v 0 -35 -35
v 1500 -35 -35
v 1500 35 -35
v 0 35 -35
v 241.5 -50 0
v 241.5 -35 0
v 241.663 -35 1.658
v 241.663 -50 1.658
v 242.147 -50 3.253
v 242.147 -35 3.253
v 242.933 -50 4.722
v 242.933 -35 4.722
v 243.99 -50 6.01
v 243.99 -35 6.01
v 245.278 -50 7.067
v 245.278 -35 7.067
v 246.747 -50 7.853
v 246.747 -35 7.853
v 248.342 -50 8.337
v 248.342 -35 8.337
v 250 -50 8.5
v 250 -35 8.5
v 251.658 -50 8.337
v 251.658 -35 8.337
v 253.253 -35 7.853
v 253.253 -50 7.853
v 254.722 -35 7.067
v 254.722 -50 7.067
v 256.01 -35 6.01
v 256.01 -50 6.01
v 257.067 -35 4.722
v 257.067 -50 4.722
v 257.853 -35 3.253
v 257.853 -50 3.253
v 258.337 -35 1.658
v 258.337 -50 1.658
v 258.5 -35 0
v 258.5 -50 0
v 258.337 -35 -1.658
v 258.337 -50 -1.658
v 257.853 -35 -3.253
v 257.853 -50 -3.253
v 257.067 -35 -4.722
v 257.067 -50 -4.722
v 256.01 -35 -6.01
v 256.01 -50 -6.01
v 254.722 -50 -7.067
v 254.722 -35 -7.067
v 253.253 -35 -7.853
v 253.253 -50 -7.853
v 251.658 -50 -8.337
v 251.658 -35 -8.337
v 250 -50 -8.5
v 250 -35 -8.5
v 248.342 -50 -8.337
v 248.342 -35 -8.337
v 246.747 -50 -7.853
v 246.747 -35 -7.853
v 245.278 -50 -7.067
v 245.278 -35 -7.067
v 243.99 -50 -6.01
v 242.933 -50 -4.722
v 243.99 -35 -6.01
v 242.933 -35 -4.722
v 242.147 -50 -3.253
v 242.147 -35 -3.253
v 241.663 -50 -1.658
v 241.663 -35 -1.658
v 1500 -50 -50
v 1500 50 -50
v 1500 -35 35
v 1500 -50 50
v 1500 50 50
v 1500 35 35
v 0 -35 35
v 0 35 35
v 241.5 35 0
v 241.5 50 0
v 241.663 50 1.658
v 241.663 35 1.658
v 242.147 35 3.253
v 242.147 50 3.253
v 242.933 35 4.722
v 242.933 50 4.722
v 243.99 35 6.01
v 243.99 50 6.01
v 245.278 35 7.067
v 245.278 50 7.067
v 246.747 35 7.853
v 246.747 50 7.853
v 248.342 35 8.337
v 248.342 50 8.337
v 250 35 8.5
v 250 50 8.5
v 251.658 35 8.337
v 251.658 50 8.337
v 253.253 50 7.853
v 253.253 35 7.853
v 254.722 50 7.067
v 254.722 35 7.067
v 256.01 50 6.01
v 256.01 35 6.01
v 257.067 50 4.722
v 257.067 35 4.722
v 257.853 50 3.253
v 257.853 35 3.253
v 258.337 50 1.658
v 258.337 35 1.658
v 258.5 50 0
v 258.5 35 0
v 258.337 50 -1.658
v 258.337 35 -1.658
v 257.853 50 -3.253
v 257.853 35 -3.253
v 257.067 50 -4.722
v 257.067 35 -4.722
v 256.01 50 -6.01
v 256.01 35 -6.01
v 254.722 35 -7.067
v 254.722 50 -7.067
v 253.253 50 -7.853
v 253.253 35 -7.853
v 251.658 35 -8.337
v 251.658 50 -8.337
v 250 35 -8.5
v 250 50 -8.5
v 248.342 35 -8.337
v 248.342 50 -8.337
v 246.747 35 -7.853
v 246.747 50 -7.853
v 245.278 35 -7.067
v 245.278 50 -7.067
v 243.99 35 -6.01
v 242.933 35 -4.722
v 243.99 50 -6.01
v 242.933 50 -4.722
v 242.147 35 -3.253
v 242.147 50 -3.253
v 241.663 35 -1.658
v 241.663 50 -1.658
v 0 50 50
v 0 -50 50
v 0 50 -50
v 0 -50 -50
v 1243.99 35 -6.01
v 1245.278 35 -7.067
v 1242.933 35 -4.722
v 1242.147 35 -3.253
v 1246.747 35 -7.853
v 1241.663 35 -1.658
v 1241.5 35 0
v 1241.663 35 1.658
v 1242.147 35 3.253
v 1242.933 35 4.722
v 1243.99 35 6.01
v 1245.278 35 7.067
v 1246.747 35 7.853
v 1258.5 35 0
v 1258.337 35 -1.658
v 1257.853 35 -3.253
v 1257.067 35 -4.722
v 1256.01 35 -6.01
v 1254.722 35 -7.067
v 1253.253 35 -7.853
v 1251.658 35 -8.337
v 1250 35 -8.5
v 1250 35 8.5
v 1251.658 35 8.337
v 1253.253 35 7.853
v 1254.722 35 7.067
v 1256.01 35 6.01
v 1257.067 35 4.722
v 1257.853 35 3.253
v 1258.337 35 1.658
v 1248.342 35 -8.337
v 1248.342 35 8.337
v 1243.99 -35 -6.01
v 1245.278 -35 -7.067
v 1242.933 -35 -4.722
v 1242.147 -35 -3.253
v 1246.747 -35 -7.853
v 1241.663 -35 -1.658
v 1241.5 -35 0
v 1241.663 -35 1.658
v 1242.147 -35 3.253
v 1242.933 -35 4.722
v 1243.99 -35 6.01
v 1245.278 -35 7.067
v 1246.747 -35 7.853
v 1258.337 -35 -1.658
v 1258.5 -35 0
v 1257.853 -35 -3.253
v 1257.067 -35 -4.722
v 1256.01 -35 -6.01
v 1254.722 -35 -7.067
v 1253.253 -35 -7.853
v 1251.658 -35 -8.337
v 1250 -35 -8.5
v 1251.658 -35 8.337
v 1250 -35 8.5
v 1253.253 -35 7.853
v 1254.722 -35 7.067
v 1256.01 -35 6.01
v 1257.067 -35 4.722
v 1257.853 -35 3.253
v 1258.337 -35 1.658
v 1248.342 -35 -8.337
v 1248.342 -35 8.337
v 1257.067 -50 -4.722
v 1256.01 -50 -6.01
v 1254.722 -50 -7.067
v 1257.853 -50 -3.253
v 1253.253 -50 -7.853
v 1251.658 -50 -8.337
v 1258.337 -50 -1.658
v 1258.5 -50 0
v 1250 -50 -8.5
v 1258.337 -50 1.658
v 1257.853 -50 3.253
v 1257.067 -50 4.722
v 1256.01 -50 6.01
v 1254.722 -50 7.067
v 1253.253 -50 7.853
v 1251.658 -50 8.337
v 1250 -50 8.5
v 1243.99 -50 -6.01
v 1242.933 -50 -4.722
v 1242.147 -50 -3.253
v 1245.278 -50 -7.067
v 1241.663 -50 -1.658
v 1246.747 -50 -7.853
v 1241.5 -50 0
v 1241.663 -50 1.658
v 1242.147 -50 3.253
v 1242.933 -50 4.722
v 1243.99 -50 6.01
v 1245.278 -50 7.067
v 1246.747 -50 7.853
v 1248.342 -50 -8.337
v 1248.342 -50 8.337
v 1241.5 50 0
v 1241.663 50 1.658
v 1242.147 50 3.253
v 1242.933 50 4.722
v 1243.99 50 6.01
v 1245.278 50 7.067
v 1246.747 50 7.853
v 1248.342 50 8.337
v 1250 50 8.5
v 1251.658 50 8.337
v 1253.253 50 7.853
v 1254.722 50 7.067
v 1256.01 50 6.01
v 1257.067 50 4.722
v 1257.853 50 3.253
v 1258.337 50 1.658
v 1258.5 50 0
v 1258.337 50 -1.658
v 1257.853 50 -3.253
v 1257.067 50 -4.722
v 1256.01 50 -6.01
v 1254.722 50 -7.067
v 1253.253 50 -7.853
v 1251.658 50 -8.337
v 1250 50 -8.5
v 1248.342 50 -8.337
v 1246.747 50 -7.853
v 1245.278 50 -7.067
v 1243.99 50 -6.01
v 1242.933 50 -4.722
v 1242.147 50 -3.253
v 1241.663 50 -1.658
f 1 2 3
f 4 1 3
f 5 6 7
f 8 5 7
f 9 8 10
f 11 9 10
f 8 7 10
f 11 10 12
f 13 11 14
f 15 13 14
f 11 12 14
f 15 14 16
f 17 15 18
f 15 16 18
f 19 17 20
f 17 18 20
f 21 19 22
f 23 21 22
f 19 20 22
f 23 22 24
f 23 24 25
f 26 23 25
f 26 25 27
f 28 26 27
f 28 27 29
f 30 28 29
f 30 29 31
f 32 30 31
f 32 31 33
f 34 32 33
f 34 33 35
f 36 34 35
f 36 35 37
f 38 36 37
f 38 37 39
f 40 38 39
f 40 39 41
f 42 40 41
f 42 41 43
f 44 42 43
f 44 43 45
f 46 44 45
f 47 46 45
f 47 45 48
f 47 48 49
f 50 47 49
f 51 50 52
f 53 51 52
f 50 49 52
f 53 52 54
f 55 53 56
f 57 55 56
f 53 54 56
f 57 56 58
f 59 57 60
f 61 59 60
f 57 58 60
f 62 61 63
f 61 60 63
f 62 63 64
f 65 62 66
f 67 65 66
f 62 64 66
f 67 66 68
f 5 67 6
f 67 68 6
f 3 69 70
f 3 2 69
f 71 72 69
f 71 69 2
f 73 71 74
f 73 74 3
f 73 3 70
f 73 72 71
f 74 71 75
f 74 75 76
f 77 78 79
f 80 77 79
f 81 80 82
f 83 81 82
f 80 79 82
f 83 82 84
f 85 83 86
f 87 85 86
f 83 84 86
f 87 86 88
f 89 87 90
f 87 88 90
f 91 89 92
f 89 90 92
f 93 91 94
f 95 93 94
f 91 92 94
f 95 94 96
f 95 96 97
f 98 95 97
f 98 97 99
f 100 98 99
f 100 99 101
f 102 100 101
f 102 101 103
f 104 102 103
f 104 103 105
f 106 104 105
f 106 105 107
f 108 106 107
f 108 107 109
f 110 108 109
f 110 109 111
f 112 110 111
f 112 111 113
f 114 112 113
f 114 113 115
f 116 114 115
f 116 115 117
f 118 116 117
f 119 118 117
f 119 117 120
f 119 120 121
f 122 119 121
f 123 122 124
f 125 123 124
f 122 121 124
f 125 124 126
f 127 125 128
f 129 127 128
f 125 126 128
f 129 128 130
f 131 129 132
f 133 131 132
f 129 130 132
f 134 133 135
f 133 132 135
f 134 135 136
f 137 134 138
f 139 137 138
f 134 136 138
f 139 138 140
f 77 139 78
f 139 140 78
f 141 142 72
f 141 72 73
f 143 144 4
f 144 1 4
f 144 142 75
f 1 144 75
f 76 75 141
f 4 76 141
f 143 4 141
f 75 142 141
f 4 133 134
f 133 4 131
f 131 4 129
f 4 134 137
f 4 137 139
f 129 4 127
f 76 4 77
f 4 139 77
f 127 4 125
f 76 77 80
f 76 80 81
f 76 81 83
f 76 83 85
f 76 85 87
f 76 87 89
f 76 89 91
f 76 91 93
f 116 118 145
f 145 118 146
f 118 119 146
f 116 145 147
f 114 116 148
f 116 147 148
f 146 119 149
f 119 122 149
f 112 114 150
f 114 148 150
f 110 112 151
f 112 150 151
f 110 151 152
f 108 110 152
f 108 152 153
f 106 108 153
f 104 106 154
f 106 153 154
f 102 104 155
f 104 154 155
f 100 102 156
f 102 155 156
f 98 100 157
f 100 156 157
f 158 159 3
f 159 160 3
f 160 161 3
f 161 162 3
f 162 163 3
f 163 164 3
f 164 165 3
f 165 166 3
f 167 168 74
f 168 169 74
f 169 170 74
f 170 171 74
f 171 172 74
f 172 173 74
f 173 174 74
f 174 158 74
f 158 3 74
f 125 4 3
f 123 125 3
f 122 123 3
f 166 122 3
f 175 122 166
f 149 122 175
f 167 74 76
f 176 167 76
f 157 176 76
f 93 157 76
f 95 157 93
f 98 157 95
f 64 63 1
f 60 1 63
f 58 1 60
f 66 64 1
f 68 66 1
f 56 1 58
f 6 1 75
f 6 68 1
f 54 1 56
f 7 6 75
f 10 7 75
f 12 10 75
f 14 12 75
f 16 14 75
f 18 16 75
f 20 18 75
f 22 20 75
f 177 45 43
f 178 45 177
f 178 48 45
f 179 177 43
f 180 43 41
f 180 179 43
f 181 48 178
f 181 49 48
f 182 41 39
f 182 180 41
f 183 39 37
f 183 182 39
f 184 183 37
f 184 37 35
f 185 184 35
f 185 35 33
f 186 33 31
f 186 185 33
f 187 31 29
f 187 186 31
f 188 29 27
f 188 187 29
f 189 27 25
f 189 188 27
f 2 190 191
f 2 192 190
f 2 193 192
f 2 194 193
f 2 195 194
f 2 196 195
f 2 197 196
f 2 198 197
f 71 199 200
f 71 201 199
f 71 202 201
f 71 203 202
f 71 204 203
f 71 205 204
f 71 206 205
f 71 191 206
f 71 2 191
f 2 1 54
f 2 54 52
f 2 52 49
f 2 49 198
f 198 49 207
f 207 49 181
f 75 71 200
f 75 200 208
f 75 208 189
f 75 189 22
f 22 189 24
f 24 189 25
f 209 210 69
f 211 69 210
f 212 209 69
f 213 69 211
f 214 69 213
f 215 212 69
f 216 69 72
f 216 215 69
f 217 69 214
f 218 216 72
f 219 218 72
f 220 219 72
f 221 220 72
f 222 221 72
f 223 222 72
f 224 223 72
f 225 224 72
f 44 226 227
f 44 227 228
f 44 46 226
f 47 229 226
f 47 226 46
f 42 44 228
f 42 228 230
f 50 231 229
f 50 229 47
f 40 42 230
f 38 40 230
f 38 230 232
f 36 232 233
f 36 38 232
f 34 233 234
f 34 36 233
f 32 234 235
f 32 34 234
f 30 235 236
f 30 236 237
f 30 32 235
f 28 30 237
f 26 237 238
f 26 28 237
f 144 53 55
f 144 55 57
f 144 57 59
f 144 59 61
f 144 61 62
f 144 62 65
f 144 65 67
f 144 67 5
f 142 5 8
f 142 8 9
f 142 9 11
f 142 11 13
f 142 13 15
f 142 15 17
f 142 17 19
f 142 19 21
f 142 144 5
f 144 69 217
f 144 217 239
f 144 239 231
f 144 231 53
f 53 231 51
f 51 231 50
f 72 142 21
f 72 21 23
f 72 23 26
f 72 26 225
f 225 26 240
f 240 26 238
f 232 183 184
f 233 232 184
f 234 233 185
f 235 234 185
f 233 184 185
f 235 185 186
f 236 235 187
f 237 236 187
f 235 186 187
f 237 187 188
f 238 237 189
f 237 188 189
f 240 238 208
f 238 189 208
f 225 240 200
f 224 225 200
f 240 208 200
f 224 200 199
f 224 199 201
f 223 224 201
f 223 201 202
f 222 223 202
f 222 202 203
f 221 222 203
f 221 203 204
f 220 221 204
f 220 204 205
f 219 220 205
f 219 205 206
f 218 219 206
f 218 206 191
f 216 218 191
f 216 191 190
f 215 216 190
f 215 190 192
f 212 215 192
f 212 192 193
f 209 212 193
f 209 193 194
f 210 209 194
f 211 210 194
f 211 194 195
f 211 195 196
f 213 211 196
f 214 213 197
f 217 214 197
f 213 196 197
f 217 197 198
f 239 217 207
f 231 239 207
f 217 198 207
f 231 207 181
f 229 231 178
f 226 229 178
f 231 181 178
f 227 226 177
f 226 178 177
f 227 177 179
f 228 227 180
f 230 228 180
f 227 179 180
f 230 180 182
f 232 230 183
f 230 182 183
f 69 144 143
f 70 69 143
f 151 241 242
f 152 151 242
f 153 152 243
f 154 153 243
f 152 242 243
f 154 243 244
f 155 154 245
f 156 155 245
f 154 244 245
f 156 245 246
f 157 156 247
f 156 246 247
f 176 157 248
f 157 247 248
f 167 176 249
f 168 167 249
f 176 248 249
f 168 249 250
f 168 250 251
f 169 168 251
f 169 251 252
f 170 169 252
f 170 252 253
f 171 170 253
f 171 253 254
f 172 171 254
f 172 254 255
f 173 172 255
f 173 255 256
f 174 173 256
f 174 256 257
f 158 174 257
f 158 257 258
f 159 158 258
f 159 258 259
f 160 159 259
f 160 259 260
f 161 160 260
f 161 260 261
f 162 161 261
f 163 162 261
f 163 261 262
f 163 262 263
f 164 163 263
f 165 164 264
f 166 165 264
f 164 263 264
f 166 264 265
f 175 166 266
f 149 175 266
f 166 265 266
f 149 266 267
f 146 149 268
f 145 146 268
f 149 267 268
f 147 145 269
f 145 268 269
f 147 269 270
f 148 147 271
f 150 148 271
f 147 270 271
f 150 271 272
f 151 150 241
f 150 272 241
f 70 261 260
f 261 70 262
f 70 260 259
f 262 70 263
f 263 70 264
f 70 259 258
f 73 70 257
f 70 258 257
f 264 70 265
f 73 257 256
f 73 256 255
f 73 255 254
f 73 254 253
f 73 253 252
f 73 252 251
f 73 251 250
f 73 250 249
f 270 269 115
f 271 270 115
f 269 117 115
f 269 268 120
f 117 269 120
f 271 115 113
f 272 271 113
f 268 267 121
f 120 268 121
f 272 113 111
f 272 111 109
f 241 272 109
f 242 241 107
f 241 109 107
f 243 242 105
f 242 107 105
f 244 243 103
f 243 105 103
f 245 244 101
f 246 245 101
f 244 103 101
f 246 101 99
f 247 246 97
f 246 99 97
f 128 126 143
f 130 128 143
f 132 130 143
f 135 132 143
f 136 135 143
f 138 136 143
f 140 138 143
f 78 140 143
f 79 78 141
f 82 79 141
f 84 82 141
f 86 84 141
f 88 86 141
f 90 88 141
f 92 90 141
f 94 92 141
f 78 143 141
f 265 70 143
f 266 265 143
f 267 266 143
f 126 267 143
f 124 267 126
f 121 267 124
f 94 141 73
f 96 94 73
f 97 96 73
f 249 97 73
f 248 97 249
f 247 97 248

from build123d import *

# Parameters (mm, degrees)
F0_W     = 100
F0_H     = 100
F1_DEPTH = 1500
F2_W     = 70
F2_H     = 70
F3_DEPTH = 2001
F5_D     = 17


with BuildPart() as f1:
    # F0 (on Right) → F1 (new body)
    with BuildSketch(Plane.YZ):
        Rectangle(F0_W, F0_H)
    extrude(amount=F1_DEPTH)

    # F2 (on face) → F3 (cut)
    with BuildSketch(Plane.YZ.offset(1500)):
        Rectangle(F2_W, F2_H)
    extrude(amount=-F3_DEPTH, mode=Mode.SUBTRACT)

    # F5 (through all)
    with Locations(Plane.XZ.offset(50)):
        with Locations((250, 0), (1250, 0)):
            Hole(F5_D / 2)


solid = f1.part
